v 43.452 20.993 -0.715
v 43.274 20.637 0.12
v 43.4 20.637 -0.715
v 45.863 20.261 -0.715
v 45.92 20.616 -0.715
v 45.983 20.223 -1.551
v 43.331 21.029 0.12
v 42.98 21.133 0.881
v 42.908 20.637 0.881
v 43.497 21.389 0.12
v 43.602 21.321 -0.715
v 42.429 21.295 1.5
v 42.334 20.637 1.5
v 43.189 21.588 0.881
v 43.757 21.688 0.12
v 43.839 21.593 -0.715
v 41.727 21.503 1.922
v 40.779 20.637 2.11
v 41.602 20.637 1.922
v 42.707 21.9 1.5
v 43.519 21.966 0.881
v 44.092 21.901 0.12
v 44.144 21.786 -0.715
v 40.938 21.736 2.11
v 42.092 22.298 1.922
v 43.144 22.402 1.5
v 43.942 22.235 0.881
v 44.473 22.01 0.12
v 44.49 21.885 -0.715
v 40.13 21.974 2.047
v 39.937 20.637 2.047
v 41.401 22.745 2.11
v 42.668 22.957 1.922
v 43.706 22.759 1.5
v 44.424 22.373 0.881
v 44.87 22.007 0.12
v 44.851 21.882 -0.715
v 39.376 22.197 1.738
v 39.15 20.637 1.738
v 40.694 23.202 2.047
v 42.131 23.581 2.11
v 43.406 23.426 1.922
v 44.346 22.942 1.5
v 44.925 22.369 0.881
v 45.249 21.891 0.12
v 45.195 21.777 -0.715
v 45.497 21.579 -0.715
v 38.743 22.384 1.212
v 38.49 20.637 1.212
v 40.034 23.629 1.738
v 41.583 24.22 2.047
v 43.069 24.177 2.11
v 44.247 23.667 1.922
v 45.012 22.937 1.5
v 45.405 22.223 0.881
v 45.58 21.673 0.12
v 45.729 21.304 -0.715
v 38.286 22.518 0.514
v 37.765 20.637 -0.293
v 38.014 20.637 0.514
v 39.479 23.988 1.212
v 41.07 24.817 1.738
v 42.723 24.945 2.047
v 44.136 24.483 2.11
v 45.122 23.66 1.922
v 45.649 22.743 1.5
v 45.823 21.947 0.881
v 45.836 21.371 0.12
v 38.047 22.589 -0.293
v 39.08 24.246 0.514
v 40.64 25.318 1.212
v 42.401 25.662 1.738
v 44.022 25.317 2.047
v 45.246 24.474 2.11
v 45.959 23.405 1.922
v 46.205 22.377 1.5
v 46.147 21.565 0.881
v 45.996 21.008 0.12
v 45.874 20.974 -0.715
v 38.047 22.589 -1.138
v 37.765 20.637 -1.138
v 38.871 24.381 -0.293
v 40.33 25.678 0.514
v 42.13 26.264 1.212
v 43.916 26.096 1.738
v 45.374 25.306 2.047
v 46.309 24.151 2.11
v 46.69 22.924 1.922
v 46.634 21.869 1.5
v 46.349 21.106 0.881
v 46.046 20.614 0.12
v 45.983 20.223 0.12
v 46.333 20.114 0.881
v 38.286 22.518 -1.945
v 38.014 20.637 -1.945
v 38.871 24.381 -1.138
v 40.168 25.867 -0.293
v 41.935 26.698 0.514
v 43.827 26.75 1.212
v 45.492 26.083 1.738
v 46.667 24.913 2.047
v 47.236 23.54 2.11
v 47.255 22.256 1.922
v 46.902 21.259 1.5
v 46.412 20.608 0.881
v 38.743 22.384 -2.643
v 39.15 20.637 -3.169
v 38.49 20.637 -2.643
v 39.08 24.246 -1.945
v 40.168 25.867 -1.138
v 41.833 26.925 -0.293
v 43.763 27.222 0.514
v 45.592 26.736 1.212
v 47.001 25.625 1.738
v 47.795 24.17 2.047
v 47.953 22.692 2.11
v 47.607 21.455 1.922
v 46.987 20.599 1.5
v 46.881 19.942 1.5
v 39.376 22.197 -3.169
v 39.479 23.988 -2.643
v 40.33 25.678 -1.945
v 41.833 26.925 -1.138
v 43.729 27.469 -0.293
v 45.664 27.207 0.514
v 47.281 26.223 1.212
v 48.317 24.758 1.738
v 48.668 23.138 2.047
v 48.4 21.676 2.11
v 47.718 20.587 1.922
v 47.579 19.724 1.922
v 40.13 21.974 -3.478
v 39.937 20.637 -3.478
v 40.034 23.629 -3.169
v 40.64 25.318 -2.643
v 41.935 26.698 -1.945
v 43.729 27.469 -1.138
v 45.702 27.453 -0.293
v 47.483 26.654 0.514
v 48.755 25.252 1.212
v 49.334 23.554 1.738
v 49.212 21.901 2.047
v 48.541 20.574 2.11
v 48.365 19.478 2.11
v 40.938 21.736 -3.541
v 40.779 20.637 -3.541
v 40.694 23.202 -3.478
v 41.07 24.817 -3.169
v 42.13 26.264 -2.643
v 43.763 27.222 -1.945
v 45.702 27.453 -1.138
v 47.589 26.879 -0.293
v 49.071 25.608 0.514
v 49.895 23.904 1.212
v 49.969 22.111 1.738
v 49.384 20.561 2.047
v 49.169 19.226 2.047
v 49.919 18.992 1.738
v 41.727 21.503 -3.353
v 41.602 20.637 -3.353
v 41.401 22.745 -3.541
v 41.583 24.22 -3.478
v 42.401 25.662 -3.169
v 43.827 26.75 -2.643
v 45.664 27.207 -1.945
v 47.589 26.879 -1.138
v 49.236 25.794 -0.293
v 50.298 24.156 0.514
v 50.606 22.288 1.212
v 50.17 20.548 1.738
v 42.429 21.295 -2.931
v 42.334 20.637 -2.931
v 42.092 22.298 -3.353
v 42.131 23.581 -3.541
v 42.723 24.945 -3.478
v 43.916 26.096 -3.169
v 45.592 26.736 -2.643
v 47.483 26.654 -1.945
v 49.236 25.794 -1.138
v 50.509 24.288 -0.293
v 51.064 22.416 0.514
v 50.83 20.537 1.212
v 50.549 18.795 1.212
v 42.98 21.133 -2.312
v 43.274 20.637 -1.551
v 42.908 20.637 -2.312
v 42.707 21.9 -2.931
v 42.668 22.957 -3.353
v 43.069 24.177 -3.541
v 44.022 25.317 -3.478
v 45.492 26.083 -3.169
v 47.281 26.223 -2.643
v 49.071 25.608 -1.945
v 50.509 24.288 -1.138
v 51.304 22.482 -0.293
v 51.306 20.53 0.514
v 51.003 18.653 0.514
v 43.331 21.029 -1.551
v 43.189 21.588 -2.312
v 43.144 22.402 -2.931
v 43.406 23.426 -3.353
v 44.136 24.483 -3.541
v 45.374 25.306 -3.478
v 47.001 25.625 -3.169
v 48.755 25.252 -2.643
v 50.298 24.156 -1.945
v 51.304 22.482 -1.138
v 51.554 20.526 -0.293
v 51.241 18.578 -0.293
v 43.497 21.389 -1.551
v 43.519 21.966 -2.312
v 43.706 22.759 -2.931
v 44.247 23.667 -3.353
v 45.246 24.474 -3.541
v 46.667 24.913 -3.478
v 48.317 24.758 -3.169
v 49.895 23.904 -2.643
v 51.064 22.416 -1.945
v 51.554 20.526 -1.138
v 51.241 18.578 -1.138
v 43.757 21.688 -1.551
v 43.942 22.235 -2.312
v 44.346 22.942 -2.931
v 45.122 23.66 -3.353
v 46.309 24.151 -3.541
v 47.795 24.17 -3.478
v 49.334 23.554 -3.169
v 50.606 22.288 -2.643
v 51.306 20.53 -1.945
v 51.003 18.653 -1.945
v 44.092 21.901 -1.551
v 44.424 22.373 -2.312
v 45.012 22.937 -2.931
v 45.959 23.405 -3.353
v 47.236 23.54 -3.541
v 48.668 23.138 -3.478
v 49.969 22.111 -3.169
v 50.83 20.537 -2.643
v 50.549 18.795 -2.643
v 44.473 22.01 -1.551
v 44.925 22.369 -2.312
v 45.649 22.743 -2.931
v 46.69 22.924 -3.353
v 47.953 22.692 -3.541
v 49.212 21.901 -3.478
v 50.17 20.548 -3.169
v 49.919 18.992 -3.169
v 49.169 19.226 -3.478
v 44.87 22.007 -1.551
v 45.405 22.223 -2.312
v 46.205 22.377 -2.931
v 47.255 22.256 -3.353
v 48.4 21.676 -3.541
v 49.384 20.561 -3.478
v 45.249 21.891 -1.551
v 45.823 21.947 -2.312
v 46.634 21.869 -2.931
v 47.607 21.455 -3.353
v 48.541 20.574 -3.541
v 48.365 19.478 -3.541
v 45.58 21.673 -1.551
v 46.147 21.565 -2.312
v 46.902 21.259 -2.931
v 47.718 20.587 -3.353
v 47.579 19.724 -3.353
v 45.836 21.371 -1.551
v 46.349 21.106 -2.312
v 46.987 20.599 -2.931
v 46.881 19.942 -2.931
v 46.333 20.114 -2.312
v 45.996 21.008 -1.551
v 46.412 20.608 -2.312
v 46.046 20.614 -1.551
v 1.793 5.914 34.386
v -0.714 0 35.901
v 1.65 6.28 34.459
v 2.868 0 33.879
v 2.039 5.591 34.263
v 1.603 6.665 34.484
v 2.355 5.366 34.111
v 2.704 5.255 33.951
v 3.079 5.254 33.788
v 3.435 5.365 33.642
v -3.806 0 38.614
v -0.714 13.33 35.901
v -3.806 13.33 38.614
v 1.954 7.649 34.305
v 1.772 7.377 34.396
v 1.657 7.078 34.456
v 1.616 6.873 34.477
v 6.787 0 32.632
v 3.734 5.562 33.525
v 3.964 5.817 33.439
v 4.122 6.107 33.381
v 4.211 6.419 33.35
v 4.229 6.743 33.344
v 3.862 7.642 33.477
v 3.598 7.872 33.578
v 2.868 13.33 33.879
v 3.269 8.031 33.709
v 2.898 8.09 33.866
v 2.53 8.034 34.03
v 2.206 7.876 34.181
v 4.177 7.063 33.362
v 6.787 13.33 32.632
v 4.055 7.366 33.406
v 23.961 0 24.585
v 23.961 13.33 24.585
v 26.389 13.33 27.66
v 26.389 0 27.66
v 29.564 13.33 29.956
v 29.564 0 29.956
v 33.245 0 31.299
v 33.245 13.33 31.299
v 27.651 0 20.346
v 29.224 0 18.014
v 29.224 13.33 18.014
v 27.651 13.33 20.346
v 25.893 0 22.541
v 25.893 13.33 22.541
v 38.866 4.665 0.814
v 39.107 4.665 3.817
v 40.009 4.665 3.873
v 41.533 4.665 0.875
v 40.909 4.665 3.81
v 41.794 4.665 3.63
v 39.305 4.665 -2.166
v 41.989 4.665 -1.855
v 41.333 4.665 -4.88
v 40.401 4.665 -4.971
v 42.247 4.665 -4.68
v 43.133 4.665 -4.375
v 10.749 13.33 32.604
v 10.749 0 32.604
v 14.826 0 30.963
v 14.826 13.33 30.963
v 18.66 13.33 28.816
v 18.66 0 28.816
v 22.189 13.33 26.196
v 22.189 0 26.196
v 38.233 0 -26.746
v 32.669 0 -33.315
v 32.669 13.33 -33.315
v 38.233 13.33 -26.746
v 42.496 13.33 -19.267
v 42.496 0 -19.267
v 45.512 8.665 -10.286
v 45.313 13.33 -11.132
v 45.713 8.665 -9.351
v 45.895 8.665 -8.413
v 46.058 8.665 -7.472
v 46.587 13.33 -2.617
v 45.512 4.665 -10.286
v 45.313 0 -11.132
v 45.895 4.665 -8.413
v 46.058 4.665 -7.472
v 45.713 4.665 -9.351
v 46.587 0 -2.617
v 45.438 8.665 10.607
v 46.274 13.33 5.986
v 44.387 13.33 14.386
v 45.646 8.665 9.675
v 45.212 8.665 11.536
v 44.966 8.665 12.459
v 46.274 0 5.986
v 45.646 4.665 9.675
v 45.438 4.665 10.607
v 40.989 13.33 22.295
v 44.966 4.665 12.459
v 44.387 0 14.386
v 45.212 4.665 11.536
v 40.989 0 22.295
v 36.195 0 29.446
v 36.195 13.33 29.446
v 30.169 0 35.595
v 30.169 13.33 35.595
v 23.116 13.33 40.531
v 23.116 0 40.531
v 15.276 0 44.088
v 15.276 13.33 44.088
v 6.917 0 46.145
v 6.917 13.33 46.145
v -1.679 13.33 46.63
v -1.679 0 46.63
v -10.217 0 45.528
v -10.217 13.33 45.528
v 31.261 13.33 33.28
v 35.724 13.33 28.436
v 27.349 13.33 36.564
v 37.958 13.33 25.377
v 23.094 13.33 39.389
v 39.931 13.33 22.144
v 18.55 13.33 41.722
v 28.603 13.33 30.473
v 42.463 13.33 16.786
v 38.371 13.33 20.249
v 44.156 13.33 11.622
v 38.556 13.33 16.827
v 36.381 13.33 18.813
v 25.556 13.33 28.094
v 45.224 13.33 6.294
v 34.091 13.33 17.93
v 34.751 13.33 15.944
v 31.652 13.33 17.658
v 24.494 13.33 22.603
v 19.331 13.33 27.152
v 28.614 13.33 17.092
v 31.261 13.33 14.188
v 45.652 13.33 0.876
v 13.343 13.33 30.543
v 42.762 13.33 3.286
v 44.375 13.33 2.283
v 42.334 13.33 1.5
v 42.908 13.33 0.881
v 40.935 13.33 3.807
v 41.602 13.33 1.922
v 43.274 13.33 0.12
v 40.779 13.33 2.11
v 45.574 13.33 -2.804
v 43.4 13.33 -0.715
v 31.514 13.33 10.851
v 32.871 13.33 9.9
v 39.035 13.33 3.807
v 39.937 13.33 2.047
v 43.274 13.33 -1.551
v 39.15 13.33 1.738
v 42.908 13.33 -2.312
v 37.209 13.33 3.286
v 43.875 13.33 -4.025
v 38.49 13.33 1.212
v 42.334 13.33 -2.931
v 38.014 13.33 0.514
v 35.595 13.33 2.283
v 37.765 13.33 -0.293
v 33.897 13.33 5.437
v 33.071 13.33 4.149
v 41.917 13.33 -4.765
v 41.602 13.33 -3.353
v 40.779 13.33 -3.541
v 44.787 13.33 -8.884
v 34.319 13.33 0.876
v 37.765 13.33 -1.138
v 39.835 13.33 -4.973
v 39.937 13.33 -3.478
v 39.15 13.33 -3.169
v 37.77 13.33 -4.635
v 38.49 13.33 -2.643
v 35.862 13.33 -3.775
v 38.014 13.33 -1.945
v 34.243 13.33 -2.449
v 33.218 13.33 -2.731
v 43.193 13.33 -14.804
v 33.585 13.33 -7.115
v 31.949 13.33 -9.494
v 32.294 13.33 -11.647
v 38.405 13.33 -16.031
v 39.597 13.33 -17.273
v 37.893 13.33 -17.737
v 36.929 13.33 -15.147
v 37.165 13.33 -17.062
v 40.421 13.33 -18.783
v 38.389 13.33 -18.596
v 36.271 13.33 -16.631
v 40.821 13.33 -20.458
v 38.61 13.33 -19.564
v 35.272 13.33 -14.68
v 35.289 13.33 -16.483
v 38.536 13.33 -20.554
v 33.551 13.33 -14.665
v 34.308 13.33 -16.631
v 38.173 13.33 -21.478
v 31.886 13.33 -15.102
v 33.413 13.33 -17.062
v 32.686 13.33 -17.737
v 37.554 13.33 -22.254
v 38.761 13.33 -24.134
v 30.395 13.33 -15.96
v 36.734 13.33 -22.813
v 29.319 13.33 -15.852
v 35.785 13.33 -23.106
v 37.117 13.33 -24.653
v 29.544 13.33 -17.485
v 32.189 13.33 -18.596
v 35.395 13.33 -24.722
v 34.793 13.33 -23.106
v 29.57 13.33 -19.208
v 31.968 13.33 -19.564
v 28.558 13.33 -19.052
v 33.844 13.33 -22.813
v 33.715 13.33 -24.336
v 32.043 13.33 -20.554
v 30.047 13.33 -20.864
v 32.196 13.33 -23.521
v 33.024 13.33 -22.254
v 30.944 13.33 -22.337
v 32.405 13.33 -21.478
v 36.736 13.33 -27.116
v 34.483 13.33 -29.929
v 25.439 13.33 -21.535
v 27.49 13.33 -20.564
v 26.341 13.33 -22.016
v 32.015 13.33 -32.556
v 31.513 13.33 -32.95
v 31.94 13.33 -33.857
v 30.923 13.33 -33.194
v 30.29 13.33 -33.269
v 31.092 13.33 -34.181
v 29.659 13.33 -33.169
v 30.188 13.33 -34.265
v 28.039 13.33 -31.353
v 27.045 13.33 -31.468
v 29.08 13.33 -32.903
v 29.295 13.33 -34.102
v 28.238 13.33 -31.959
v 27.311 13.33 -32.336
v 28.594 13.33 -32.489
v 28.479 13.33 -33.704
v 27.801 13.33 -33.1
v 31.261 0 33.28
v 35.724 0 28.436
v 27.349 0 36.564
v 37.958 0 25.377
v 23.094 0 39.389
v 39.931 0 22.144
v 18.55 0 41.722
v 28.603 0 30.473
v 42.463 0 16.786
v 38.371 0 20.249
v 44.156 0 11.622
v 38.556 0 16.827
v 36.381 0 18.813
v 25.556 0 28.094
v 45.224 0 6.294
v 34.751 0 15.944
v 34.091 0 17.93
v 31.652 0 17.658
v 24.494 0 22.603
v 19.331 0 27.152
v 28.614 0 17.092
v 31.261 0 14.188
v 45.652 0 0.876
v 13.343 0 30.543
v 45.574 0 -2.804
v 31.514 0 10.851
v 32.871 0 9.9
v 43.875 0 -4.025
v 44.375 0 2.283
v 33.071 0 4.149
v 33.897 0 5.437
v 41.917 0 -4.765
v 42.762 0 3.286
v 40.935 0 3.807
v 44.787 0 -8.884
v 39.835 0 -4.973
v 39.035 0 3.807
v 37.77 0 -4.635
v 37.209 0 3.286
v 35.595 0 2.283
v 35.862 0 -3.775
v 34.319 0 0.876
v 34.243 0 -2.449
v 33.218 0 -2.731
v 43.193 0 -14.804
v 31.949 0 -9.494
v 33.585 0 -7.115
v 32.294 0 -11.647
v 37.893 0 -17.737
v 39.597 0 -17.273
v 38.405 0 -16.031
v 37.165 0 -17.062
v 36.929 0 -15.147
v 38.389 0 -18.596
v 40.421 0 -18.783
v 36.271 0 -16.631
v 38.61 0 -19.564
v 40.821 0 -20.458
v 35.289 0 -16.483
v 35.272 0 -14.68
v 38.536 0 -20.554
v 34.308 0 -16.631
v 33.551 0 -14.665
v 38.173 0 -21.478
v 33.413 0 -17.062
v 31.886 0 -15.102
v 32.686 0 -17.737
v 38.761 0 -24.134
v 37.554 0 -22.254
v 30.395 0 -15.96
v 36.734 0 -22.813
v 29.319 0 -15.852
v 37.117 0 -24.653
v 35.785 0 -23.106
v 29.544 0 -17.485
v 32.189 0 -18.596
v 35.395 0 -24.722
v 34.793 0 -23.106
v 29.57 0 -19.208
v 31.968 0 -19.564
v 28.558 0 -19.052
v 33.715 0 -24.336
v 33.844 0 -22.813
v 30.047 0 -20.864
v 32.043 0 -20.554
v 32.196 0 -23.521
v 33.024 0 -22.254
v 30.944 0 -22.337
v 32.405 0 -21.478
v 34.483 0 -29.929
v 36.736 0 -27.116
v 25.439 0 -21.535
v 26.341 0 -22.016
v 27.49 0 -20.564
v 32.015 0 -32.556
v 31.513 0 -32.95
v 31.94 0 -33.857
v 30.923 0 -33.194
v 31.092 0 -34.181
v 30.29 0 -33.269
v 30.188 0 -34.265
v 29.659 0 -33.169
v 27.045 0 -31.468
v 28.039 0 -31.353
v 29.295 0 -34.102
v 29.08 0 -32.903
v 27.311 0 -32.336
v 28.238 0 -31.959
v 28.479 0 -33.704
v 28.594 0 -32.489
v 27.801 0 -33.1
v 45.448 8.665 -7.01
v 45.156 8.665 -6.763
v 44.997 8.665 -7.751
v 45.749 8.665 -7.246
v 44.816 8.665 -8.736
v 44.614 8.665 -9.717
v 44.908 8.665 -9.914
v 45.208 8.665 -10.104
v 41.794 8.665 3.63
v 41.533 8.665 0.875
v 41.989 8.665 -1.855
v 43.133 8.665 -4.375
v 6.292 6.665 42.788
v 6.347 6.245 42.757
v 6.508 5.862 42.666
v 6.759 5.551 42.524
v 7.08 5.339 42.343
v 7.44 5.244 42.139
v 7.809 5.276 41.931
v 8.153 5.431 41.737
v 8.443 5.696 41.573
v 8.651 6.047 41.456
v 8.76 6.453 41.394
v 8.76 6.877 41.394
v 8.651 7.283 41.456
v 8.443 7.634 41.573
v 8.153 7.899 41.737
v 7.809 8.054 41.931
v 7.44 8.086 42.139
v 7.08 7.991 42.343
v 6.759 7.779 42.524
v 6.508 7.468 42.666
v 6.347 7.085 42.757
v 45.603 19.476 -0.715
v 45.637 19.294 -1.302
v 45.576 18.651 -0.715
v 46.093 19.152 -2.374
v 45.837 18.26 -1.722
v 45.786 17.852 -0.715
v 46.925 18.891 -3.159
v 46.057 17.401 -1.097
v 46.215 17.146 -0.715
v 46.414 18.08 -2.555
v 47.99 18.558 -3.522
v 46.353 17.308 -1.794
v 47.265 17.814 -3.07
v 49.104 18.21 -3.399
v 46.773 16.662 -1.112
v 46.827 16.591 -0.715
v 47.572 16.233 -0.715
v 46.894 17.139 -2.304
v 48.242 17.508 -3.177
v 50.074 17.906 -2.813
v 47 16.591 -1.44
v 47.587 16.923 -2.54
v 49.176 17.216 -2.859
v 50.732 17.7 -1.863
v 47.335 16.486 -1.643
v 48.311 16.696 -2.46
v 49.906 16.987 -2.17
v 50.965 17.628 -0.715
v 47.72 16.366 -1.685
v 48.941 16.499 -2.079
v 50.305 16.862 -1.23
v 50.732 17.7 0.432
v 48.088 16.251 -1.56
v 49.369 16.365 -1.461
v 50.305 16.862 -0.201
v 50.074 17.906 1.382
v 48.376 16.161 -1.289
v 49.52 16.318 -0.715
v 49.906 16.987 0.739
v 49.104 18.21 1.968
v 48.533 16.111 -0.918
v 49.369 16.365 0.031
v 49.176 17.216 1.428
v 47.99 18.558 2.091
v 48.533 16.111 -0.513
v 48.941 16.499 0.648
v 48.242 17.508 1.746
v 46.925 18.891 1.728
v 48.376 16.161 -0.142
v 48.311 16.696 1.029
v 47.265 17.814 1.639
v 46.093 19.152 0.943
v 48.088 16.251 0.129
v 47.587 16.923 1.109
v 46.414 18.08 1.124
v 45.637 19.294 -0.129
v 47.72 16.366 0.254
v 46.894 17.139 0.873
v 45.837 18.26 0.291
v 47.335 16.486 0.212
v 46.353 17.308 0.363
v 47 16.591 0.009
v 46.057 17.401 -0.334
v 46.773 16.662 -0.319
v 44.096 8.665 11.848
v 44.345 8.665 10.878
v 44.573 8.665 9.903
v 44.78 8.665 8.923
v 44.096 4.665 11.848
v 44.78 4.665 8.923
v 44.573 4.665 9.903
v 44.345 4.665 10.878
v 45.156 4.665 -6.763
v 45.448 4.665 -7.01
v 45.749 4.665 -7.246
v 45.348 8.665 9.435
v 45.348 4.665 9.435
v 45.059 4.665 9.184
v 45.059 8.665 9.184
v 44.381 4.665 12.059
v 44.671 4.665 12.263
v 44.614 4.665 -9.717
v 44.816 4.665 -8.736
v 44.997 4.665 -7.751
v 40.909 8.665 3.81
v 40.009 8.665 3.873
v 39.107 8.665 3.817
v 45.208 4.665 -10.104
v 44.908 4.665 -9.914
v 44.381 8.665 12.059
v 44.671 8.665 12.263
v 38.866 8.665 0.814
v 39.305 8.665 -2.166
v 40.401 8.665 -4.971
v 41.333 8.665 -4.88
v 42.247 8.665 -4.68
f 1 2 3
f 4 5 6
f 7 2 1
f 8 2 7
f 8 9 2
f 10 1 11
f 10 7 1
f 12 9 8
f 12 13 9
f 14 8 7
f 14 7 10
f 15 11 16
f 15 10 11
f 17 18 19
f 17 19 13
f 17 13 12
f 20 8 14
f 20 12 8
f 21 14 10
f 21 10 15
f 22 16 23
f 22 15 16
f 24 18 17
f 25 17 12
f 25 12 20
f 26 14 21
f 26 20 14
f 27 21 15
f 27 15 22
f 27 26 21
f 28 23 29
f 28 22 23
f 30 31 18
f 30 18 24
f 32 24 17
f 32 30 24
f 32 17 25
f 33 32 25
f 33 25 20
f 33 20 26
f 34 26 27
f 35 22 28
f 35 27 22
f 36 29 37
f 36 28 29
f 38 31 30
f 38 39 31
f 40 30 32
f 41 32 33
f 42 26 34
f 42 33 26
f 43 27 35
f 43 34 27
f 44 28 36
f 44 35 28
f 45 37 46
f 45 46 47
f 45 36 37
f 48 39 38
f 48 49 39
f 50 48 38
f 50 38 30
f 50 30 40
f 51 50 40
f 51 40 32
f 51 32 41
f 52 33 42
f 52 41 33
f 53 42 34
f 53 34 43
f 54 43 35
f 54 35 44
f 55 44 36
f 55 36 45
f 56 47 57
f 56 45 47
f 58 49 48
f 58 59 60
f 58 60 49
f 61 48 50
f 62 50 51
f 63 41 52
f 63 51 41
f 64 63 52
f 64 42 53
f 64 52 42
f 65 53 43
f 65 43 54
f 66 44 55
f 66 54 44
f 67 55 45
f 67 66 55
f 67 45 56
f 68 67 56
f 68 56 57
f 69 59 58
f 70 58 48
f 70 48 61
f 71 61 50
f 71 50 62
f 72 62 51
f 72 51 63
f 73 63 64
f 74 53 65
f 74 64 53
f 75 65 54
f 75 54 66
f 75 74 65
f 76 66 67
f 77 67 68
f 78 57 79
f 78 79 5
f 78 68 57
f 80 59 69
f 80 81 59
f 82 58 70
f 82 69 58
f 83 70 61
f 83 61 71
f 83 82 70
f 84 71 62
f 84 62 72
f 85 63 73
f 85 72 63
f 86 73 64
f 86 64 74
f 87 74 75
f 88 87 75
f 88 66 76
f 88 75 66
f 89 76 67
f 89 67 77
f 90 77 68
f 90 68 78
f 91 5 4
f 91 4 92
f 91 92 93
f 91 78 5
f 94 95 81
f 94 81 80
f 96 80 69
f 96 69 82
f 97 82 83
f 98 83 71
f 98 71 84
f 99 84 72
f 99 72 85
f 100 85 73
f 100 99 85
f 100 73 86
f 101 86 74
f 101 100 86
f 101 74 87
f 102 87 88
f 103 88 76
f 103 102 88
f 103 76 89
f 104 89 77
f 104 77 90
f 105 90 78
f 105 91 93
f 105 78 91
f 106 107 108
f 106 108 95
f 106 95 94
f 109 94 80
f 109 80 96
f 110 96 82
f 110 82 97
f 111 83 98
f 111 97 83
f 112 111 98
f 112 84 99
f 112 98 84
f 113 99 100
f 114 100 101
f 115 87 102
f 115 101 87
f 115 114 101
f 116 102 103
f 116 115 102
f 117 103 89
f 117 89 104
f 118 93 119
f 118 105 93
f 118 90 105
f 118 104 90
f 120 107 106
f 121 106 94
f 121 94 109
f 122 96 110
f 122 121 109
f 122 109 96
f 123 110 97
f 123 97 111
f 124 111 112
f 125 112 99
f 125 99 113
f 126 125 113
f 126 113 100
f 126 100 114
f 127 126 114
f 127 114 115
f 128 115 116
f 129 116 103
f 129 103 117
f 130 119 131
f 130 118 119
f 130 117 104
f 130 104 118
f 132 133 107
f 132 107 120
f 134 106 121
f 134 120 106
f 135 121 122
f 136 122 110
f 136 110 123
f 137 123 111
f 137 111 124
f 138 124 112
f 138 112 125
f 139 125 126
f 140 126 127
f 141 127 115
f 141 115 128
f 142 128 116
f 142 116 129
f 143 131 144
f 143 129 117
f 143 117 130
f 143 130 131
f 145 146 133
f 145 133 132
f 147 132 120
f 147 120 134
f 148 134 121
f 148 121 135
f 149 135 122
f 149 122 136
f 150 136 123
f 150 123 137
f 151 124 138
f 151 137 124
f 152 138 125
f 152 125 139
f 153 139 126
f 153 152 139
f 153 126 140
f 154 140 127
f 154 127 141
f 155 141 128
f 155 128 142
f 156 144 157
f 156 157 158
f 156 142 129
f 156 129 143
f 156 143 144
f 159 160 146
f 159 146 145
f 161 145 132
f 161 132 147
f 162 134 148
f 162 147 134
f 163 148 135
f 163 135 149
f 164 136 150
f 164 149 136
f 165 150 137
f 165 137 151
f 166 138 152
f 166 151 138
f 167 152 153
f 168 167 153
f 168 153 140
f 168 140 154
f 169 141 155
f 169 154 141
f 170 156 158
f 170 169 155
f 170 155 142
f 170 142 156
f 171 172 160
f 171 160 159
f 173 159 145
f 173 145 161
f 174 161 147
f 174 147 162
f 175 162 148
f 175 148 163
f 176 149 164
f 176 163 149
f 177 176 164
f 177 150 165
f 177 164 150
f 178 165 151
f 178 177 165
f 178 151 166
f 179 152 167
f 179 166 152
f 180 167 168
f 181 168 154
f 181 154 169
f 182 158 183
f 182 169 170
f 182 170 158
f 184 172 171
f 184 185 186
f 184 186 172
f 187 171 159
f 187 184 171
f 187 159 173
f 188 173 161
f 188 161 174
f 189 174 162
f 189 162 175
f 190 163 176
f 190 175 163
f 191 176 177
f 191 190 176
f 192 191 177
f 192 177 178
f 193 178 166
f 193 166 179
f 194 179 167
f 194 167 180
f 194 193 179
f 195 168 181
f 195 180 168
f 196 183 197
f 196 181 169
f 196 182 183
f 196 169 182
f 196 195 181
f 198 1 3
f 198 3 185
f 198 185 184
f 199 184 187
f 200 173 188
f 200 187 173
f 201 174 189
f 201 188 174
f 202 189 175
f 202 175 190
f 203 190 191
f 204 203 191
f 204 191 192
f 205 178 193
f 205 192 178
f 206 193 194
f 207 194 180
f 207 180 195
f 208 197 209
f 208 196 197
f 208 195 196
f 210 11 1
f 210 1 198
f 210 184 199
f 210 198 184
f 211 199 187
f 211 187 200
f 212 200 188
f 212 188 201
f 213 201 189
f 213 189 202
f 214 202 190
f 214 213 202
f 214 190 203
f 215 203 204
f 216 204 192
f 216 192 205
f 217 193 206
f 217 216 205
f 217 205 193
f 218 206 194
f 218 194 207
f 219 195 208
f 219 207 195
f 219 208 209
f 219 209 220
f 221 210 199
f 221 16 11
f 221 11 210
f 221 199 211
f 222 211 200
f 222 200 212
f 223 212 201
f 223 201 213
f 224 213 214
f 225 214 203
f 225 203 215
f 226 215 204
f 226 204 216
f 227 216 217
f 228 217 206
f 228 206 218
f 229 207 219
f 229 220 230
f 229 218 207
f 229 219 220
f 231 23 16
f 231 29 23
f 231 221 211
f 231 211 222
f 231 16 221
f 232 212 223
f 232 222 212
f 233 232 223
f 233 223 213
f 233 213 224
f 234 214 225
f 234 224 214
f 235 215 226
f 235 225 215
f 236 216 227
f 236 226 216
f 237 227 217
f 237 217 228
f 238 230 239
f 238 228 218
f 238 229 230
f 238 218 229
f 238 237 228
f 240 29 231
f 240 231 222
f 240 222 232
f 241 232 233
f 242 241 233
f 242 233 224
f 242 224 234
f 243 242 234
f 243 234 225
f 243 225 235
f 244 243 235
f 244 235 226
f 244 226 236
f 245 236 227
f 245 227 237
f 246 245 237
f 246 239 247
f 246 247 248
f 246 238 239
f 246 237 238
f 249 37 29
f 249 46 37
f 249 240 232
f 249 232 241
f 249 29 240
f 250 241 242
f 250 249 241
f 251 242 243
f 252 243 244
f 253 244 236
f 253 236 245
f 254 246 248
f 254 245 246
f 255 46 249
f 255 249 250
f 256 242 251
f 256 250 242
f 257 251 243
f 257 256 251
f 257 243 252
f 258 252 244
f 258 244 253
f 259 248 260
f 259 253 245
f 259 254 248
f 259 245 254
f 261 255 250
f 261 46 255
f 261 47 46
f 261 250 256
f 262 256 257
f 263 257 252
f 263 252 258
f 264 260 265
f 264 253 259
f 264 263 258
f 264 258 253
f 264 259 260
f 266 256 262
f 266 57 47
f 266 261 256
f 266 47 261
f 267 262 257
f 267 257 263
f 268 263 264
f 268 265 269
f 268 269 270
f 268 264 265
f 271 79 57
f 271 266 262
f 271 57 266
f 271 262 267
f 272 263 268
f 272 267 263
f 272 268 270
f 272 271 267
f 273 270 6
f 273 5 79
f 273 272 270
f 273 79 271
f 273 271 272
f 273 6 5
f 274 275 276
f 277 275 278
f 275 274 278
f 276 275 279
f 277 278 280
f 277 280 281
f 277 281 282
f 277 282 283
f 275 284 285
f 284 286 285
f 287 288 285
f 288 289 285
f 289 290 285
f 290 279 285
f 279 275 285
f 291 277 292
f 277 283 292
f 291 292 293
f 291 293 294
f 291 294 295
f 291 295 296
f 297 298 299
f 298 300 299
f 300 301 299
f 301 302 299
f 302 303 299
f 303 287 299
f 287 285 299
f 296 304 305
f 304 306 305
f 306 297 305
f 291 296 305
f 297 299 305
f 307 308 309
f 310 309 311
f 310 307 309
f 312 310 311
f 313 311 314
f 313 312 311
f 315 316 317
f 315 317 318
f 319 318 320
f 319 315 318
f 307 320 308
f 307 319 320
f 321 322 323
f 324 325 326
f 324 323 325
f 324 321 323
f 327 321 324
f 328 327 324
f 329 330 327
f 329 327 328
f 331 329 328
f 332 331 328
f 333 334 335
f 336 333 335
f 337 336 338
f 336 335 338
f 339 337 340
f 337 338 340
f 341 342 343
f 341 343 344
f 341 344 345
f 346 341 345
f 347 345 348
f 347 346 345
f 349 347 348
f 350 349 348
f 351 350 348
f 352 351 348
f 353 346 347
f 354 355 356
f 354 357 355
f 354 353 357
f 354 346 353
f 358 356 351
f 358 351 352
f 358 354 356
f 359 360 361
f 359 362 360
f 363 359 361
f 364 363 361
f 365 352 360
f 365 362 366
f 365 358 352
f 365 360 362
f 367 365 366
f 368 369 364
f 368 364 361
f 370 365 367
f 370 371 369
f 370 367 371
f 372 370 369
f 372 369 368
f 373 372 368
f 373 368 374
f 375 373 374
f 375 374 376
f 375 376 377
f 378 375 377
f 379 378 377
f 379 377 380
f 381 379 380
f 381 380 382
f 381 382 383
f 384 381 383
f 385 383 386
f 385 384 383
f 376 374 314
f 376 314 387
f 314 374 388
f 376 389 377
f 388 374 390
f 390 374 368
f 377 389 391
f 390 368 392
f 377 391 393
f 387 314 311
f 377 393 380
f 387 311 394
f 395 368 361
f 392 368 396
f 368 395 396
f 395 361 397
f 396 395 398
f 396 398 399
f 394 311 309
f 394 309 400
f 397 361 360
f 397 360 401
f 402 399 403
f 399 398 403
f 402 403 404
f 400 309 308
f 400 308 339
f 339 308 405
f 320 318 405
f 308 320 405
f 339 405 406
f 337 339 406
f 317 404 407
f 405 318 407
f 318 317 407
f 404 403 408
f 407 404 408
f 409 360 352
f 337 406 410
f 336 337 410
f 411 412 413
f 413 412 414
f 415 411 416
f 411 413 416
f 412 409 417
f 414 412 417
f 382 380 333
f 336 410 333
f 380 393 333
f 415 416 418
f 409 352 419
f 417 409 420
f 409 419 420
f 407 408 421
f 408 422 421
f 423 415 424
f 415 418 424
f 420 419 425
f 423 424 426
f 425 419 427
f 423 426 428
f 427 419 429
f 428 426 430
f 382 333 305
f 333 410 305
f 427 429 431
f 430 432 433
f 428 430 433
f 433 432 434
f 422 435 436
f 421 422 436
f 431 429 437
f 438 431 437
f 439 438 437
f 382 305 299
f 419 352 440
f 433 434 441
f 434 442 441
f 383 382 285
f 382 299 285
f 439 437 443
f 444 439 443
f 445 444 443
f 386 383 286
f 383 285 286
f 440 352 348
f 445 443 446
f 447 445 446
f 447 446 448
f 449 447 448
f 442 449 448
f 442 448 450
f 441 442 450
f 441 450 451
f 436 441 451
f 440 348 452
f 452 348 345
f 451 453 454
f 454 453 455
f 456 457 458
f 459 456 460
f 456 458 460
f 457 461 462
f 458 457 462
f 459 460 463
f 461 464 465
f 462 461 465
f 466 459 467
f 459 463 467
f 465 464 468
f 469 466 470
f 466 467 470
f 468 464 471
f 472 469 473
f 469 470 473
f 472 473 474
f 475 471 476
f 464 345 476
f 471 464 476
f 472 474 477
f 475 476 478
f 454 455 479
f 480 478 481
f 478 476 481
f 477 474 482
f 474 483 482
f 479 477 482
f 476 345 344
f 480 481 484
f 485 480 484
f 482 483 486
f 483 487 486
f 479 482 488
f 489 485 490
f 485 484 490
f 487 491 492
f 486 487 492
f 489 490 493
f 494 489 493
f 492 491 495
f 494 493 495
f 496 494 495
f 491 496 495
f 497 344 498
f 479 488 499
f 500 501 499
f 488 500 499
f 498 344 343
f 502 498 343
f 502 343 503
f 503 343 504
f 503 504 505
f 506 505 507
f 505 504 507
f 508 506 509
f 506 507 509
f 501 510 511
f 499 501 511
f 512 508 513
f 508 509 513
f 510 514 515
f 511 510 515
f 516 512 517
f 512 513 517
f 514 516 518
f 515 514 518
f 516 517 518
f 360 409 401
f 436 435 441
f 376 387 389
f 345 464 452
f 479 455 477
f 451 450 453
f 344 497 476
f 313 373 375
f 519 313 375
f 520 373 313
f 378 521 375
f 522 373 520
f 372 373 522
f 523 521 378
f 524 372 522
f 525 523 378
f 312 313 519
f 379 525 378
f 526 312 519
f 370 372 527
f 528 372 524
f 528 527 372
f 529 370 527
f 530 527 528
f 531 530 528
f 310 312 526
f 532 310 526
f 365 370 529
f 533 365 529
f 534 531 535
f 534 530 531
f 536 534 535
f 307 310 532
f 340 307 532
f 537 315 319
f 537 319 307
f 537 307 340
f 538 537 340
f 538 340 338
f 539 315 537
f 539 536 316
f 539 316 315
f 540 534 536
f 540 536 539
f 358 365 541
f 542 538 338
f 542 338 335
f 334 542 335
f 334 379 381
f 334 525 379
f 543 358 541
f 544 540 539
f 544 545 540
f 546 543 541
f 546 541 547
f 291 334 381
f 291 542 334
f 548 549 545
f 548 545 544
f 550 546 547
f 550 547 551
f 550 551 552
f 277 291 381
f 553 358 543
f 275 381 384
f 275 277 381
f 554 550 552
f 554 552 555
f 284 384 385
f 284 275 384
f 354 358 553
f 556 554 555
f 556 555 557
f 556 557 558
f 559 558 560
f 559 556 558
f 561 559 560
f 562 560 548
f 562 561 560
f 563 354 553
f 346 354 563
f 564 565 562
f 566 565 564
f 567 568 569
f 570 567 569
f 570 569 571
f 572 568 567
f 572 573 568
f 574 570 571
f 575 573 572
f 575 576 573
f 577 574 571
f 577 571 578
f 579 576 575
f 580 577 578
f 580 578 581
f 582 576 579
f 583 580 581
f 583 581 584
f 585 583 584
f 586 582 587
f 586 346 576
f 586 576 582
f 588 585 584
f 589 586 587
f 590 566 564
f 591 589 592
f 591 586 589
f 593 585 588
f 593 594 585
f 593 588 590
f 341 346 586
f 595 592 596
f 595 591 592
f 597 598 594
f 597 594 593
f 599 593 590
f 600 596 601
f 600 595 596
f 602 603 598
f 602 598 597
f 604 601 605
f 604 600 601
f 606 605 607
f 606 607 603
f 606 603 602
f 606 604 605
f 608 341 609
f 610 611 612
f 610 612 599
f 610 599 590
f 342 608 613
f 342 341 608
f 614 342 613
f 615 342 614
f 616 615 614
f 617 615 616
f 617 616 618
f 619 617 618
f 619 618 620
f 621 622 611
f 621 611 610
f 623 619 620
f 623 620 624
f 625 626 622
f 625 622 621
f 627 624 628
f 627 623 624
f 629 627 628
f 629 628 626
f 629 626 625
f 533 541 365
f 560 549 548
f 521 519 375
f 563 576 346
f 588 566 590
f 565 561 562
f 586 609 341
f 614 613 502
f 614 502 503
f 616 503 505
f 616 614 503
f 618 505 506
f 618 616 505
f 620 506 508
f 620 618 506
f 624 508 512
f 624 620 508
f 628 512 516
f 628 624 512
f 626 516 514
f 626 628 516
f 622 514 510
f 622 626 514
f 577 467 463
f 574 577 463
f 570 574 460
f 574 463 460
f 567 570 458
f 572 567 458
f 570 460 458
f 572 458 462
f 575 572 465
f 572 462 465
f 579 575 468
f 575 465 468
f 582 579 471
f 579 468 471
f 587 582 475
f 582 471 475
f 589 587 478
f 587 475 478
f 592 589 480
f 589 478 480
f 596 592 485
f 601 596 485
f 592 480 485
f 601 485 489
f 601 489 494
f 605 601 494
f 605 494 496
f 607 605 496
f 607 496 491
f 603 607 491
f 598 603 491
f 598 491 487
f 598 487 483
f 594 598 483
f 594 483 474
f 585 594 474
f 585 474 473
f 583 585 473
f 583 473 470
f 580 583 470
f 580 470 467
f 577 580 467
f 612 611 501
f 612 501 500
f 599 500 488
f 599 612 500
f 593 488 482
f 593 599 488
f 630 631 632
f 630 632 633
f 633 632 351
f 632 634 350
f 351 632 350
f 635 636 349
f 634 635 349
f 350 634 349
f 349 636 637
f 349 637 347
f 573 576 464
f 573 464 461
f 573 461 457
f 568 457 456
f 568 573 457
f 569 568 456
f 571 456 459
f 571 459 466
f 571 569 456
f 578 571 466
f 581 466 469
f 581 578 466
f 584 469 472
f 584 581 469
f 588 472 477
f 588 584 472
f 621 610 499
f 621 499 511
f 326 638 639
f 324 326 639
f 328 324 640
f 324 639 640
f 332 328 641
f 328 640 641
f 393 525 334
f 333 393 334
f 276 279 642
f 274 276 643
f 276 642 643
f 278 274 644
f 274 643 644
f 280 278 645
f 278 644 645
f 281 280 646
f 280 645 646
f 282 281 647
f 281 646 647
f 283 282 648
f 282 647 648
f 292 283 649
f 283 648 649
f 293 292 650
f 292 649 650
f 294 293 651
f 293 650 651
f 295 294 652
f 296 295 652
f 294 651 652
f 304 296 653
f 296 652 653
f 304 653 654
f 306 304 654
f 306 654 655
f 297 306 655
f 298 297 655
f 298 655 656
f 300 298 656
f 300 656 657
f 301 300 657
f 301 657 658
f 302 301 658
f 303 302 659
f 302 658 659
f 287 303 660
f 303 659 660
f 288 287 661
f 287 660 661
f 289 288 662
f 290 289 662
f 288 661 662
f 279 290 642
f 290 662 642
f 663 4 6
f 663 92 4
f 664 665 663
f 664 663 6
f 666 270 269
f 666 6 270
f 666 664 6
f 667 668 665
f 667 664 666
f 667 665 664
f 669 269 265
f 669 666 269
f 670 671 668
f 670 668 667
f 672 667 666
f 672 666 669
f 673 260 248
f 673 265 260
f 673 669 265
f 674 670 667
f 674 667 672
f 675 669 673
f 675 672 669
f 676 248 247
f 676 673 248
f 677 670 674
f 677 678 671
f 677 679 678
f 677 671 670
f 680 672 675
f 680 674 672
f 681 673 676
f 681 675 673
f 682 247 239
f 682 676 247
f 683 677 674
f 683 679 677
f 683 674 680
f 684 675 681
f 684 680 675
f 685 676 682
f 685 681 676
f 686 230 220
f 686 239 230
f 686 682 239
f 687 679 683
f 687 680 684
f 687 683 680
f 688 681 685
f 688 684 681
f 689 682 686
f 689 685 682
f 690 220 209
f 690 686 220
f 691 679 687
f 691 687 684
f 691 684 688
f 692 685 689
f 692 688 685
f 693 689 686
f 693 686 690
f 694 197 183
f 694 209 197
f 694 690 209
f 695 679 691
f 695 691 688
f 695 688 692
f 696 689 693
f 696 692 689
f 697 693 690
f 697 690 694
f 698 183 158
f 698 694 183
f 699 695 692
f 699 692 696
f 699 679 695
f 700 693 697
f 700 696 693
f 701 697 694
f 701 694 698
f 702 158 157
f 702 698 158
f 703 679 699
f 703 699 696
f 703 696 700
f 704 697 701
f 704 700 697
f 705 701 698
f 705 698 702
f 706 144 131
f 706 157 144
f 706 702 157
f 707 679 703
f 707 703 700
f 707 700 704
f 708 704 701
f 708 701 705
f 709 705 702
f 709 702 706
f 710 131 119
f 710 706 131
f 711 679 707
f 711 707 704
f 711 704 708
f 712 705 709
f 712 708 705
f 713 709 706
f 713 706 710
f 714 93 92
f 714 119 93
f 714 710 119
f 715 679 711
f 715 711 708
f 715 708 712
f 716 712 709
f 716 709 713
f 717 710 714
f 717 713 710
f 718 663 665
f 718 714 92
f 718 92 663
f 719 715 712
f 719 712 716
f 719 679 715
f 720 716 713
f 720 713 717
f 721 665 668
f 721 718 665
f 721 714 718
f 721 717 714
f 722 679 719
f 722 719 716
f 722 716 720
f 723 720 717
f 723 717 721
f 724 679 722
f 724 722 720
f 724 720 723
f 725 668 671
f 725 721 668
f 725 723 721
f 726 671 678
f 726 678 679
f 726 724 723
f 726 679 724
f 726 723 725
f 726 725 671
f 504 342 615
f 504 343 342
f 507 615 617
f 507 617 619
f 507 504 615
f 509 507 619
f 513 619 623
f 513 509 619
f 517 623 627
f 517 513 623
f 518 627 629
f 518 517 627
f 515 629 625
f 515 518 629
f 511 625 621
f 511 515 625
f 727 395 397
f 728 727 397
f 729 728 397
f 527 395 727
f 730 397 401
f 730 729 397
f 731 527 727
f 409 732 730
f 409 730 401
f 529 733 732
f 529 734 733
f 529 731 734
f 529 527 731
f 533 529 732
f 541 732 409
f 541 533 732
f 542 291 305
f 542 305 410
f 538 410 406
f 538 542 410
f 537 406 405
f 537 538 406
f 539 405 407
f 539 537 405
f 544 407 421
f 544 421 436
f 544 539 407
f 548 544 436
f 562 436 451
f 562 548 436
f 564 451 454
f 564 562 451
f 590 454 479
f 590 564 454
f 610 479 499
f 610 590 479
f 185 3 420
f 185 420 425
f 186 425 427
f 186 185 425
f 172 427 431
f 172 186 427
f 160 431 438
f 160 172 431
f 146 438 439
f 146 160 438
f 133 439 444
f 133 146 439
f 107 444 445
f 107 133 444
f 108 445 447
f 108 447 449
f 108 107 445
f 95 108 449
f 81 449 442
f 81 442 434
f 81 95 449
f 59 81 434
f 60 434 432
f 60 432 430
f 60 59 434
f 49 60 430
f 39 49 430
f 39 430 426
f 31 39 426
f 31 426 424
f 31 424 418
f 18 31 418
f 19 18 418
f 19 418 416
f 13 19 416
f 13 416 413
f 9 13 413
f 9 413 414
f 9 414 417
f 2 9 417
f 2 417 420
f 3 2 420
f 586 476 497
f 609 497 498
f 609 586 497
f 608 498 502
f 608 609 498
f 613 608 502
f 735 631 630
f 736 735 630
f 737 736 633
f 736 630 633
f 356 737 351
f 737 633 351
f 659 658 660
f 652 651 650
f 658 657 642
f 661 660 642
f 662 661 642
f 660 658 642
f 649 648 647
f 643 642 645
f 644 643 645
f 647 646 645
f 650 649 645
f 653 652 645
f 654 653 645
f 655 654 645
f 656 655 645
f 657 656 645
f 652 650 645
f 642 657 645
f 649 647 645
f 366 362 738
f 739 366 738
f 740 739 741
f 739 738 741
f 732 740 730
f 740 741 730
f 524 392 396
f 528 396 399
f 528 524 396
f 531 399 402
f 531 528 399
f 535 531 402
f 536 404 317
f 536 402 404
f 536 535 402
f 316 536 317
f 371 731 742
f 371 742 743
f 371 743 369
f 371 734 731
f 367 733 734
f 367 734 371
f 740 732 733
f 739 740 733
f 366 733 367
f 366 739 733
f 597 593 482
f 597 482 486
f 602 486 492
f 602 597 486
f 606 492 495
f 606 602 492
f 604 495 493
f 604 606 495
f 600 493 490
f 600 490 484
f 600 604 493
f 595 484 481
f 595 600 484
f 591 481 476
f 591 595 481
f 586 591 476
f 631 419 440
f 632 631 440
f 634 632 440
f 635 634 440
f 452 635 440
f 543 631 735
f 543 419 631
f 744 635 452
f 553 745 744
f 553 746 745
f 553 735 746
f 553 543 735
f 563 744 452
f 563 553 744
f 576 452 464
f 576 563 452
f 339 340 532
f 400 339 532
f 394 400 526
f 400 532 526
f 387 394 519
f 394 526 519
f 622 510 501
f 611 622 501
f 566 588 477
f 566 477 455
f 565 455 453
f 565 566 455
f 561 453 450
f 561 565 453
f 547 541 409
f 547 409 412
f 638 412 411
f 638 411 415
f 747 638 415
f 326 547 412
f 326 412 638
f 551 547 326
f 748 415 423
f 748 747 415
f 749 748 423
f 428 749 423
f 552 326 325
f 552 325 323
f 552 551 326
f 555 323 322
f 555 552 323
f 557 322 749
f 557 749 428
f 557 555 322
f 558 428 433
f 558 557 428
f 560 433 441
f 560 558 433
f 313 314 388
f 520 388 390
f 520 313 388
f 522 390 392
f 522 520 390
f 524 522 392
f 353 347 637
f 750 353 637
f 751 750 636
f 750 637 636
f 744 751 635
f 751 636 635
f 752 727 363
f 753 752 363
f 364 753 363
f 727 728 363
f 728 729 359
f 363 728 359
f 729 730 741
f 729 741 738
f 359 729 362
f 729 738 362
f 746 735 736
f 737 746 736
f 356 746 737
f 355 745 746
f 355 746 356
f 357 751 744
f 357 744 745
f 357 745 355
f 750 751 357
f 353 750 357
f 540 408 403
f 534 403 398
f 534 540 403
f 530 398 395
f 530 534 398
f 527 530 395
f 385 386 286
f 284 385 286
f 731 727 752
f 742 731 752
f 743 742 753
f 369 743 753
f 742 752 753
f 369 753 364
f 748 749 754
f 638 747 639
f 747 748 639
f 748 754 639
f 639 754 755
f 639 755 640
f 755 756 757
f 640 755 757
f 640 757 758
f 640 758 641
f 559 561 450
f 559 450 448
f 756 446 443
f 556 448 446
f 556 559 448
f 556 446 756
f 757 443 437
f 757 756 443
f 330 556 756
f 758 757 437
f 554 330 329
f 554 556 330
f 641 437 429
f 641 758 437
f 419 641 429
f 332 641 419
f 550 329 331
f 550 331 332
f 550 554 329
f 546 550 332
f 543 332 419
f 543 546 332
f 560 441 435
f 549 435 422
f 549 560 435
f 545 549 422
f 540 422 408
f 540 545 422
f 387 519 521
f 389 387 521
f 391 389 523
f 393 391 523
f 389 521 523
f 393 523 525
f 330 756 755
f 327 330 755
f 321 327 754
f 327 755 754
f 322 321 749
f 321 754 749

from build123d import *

# Parameters (mm, degrees)
BOSS_EXTRUDE1_DEPTH = 13.33
FILLET1_R           = 20
SKETCH3_R           = 3.33
CUT_EXTRUDE2_DEPTH  = 68.320131462
FILLET2_R           = 3.333
SKETCH4_R           = 2.8333333
DOME1_FACE_RADIUS   = 2.8333333
DOME1_HEIGHT        = 3.3333333
CUT_EXTRUDE3_DEPTH  = 2
CUT_EXTRUDE5_DEPTH  = 13.34
SKETCH19_R          = 1.425
CUT_EXTRUDE6_DEPTH  = 8.6


with BuildPart() as part:
    # Sketch1 → Boss-Extrude1 (new body)
    with BuildSketch(Plane(origin=(0, 0, 0), x_dir=(1, 0, 0), z_dir=(0, 1, 0))):
        with BuildLine():
            Line((25.438564969, 21.535280641), (27.993333135, 37.33))
            ThreePointArc((27.993333135, 37.33), (42.371570445, -19.53984693), (-10.216878485, -45.527694802))
            Line((-10.216878485, -45.527694802), (1.110949751, -33.311479863))
            ThreePointArc((1.110949751, -33.311479863), (30.46737546, -13.513990254), (25.438564969, 21.535280641))
        make_face()
    extrude(amount=BOSS_EXTRUDE1_DEPTH)

    # Fillet1
    fillet1_edges = [part.edges().sort_by_distance(p)[0] for p in [
        (1.110949751, 6.665, 33.311479863),
    ]]
    fillet(fillet1_edges, radius=FILLET1_R)

    # Sketch3 → Cut-Extrude2 (cut, through all)
    with BuildSketch(Plane(origin=(0, 13.33, 0), x_dir=(1, 0, 0), z_dir=(0, 1, 0))):
        with Locations(Location((35.289122258, 19.812921474, 0), (0, 0, 270))):
            Circle(SKETCH3_R)
    extrude(amount=-CUT_EXTRUDE2_DEPTH, mode=Mode.SUBTRACT)

    # Fillet2
    fillet2_edges = [part.edges().sort_by_distance(p)[0] for p in [
        (27.993333135, 6.665, -37.33),
    ]]
    fillet(fillet2_edges, radius=FILLET2_R)

    # Sweep1: sweep along a path in Sketch6
    with BuildLine(Plane.XY) as sweep1_path:
        Line((40.567020893, 13.33), (40.567020893, 20.636666))
        ThreePointArc((40.567020893, 20.636666), (45.278451651, 24.683063573), (48.567020893, 19.414645837))
    # Sketch4 → Sweep1 (sweep)
    with BuildSketch(Plane(origin=(0, 13.33, 0), x_dir=(1, 0, 0), z_dir=(0, 1, 0))):
        with Locations((40.567020893, 0.715488074)):
            Circle(SKETCH4_R)
    sweep(path=sweep1_path.line)

    # Dome1: a dome of height H over a round flat face of radius A is a cap of a sphere of radius (A * A + H * H) / (2 * H)
    dome1_r = (DOME1_FACE_RADIUS * DOME1_FACE_RADIUS + DOME1_HEIGHT * DOME1_HEIGHT) / (2 * DOME1_HEIGHT)
    dome1_base = Plane((48.567020893, 19.414645837, -0.715488074), z_dir=(-0.298539128134, -0.954397395728, 0))
    with Locations(dome1_base.offset(DOME1_HEIGHT - dome1_r)):
        dome1_ball = Sphere(dome1_r, mode=Mode.PRIVATE)
    add(split(dome1_ball, bisect_by=dome1_base, keep=Keep.TOP, mode=Mode.PRIVATE))

    # Sketch7 → Cut-Extrude3 (cut, symmetric)
    with BuildSketch(Plane(origin=(0, 6.665, 0), x_dir=(1, 0, 0), z_dir=(0, 1, 0))):
        with BuildLine():
            ThreePointArc((44.965852541, -12.459041105), (45.327303444, -11.072089345), (45.645985213, -9.674690379))
            ThreePointArc((45.645985213, -9.674690379), (41.52914689, -0.997602982), (46.057874066, 7.47180276))
            ThreePointArc((46.057874066, 7.47180276), (45.806657105, 8.882891694), (45.51221871, 10.285599066))
            ThreePointArc((45.51221871, 10.285599066), (38.862616133, -0.933548234), (44.965852541, -12.459041105))
        make_face()
    extrude(amount=CUT_EXTRUDE3_DEPTH, both=True, mode=Mode.SUBTRACT)

    # Sketch18 → Cut-Extrude5 (cut)
    with BuildSketch(Plane.XZ):
        with BuildLine():
            Line((28.039143401, -31.35294351), (26.341104847, -22.015791956))
            ThreePointArc((26.341104847, -22.015791956), (28.034108775, -19.815086303), (29.543730196, -17.484762112))
            ThreePointArc((29.543730196, -17.484762112), (32.195597251, -23.521489799), (38.760601016, -24.1340301))
            ThreePointArc((38.760601016, -24.1340301), (35.637384762, -28.544919116), (32.014856699, -32.555868143))
            ThreePointArc((32.014856699, -32.555868143), (29.659442281, -33.169198731), (28.039143401, -31.35294351))
        make_face()
        with BuildLine():
            Line((18.550254331, 41.721980589), (10.749078367, 32.603776074))
            ThreePointArc((10.749078367, 32.603776074), (16.777611199, 29.950970977), (22.188585816, 26.195716434))
            ThreePointArc((22.188585816, 26.195716434), (27.124492616, 29.226219474), (31.260994101, 33.280412374))
            ThreePointArc((31.260994101, 33.280412374), (25.260742984, 38.035910189), (18.550254331, 41.721980589))
        make_face()
        with BuildLine():
            ThreePointArc((40.820629514, -20.457561098), (36.928571374, -15.146521153), (30.394540812, -15.959974588))
            ThreePointArc((30.394540812, -15.959974588), (33.016991898, -9.403570916), (34.242514373, -2.449307946))
            ThreePointArc((34.242514373, -2.449307946), (39.834796056, -4.973265496), (45.573843855, -2.803632696))
            ThreePointArc((45.573843855, -2.803632696), (44.089869065, -11.870932812), (40.820629514, -20.457561098))
        make_face()
        with BuildLine():
            ThreePointArc((45.651589838, 0.876324867), (39.98520163, 3.873028579), (34.318813422, 0.876324867))
            ThreePointArc((34.318813422, 0.876324867), (33.458600037, 7.685764997), (31.260994101, 14.187993085))
            ThreePointArc((31.260994101, 14.187993085), (36.627069292, 16.498940097), (42.462553984, 16.785919968))
            ThreePointArc((42.462553984, 16.785919968), (44.769458221, 8.973918351), (45.651589838, 0.876324867))
        make_face()
        with BuildLine():
            ThreePointArc((39.931059829, 22.143758962), (35.264351947, 18.298272838), (29.224062449, 18.013968857))
            ThreePointArc((29.224062449, 18.013968857), (26.794540492, 21.461628545), (23.960583625, 24.58534792))
            ThreePointArc((23.960583625, 24.58534792), (27.897400776, 28.917406773), (33.24466644, 31.299005627))
            ThreePointArc((33.24466644, 31.299005627), (36.873111669, 26.929709168), (39.931059829, 22.143758962))
        make_face()
    extrude(amount=-CUT_EXTRUDE5_DEPTH, mode=Mode.SUBTRACT)

    # Sketch19 → Cut-Extrude6 (cut, symmetric)
    with BuildSketch(Plane(origin=(15.613362891, 0, 27.64706404), x_dir=(0.8707413871359999, 0, -0.491741229437267), z_dir=(0.491741229437267, 0, 0.8707413871359999))):
        with Locations(Location((-14.136648815, 6.665, 0), (0, 0, 180))):
            Circle(SKETCH19_R)
    extrude(amount=CUT_EXTRUDE6_DEPTH, both=True, mode=Mode.SUBTRACT)


solid = part.part
